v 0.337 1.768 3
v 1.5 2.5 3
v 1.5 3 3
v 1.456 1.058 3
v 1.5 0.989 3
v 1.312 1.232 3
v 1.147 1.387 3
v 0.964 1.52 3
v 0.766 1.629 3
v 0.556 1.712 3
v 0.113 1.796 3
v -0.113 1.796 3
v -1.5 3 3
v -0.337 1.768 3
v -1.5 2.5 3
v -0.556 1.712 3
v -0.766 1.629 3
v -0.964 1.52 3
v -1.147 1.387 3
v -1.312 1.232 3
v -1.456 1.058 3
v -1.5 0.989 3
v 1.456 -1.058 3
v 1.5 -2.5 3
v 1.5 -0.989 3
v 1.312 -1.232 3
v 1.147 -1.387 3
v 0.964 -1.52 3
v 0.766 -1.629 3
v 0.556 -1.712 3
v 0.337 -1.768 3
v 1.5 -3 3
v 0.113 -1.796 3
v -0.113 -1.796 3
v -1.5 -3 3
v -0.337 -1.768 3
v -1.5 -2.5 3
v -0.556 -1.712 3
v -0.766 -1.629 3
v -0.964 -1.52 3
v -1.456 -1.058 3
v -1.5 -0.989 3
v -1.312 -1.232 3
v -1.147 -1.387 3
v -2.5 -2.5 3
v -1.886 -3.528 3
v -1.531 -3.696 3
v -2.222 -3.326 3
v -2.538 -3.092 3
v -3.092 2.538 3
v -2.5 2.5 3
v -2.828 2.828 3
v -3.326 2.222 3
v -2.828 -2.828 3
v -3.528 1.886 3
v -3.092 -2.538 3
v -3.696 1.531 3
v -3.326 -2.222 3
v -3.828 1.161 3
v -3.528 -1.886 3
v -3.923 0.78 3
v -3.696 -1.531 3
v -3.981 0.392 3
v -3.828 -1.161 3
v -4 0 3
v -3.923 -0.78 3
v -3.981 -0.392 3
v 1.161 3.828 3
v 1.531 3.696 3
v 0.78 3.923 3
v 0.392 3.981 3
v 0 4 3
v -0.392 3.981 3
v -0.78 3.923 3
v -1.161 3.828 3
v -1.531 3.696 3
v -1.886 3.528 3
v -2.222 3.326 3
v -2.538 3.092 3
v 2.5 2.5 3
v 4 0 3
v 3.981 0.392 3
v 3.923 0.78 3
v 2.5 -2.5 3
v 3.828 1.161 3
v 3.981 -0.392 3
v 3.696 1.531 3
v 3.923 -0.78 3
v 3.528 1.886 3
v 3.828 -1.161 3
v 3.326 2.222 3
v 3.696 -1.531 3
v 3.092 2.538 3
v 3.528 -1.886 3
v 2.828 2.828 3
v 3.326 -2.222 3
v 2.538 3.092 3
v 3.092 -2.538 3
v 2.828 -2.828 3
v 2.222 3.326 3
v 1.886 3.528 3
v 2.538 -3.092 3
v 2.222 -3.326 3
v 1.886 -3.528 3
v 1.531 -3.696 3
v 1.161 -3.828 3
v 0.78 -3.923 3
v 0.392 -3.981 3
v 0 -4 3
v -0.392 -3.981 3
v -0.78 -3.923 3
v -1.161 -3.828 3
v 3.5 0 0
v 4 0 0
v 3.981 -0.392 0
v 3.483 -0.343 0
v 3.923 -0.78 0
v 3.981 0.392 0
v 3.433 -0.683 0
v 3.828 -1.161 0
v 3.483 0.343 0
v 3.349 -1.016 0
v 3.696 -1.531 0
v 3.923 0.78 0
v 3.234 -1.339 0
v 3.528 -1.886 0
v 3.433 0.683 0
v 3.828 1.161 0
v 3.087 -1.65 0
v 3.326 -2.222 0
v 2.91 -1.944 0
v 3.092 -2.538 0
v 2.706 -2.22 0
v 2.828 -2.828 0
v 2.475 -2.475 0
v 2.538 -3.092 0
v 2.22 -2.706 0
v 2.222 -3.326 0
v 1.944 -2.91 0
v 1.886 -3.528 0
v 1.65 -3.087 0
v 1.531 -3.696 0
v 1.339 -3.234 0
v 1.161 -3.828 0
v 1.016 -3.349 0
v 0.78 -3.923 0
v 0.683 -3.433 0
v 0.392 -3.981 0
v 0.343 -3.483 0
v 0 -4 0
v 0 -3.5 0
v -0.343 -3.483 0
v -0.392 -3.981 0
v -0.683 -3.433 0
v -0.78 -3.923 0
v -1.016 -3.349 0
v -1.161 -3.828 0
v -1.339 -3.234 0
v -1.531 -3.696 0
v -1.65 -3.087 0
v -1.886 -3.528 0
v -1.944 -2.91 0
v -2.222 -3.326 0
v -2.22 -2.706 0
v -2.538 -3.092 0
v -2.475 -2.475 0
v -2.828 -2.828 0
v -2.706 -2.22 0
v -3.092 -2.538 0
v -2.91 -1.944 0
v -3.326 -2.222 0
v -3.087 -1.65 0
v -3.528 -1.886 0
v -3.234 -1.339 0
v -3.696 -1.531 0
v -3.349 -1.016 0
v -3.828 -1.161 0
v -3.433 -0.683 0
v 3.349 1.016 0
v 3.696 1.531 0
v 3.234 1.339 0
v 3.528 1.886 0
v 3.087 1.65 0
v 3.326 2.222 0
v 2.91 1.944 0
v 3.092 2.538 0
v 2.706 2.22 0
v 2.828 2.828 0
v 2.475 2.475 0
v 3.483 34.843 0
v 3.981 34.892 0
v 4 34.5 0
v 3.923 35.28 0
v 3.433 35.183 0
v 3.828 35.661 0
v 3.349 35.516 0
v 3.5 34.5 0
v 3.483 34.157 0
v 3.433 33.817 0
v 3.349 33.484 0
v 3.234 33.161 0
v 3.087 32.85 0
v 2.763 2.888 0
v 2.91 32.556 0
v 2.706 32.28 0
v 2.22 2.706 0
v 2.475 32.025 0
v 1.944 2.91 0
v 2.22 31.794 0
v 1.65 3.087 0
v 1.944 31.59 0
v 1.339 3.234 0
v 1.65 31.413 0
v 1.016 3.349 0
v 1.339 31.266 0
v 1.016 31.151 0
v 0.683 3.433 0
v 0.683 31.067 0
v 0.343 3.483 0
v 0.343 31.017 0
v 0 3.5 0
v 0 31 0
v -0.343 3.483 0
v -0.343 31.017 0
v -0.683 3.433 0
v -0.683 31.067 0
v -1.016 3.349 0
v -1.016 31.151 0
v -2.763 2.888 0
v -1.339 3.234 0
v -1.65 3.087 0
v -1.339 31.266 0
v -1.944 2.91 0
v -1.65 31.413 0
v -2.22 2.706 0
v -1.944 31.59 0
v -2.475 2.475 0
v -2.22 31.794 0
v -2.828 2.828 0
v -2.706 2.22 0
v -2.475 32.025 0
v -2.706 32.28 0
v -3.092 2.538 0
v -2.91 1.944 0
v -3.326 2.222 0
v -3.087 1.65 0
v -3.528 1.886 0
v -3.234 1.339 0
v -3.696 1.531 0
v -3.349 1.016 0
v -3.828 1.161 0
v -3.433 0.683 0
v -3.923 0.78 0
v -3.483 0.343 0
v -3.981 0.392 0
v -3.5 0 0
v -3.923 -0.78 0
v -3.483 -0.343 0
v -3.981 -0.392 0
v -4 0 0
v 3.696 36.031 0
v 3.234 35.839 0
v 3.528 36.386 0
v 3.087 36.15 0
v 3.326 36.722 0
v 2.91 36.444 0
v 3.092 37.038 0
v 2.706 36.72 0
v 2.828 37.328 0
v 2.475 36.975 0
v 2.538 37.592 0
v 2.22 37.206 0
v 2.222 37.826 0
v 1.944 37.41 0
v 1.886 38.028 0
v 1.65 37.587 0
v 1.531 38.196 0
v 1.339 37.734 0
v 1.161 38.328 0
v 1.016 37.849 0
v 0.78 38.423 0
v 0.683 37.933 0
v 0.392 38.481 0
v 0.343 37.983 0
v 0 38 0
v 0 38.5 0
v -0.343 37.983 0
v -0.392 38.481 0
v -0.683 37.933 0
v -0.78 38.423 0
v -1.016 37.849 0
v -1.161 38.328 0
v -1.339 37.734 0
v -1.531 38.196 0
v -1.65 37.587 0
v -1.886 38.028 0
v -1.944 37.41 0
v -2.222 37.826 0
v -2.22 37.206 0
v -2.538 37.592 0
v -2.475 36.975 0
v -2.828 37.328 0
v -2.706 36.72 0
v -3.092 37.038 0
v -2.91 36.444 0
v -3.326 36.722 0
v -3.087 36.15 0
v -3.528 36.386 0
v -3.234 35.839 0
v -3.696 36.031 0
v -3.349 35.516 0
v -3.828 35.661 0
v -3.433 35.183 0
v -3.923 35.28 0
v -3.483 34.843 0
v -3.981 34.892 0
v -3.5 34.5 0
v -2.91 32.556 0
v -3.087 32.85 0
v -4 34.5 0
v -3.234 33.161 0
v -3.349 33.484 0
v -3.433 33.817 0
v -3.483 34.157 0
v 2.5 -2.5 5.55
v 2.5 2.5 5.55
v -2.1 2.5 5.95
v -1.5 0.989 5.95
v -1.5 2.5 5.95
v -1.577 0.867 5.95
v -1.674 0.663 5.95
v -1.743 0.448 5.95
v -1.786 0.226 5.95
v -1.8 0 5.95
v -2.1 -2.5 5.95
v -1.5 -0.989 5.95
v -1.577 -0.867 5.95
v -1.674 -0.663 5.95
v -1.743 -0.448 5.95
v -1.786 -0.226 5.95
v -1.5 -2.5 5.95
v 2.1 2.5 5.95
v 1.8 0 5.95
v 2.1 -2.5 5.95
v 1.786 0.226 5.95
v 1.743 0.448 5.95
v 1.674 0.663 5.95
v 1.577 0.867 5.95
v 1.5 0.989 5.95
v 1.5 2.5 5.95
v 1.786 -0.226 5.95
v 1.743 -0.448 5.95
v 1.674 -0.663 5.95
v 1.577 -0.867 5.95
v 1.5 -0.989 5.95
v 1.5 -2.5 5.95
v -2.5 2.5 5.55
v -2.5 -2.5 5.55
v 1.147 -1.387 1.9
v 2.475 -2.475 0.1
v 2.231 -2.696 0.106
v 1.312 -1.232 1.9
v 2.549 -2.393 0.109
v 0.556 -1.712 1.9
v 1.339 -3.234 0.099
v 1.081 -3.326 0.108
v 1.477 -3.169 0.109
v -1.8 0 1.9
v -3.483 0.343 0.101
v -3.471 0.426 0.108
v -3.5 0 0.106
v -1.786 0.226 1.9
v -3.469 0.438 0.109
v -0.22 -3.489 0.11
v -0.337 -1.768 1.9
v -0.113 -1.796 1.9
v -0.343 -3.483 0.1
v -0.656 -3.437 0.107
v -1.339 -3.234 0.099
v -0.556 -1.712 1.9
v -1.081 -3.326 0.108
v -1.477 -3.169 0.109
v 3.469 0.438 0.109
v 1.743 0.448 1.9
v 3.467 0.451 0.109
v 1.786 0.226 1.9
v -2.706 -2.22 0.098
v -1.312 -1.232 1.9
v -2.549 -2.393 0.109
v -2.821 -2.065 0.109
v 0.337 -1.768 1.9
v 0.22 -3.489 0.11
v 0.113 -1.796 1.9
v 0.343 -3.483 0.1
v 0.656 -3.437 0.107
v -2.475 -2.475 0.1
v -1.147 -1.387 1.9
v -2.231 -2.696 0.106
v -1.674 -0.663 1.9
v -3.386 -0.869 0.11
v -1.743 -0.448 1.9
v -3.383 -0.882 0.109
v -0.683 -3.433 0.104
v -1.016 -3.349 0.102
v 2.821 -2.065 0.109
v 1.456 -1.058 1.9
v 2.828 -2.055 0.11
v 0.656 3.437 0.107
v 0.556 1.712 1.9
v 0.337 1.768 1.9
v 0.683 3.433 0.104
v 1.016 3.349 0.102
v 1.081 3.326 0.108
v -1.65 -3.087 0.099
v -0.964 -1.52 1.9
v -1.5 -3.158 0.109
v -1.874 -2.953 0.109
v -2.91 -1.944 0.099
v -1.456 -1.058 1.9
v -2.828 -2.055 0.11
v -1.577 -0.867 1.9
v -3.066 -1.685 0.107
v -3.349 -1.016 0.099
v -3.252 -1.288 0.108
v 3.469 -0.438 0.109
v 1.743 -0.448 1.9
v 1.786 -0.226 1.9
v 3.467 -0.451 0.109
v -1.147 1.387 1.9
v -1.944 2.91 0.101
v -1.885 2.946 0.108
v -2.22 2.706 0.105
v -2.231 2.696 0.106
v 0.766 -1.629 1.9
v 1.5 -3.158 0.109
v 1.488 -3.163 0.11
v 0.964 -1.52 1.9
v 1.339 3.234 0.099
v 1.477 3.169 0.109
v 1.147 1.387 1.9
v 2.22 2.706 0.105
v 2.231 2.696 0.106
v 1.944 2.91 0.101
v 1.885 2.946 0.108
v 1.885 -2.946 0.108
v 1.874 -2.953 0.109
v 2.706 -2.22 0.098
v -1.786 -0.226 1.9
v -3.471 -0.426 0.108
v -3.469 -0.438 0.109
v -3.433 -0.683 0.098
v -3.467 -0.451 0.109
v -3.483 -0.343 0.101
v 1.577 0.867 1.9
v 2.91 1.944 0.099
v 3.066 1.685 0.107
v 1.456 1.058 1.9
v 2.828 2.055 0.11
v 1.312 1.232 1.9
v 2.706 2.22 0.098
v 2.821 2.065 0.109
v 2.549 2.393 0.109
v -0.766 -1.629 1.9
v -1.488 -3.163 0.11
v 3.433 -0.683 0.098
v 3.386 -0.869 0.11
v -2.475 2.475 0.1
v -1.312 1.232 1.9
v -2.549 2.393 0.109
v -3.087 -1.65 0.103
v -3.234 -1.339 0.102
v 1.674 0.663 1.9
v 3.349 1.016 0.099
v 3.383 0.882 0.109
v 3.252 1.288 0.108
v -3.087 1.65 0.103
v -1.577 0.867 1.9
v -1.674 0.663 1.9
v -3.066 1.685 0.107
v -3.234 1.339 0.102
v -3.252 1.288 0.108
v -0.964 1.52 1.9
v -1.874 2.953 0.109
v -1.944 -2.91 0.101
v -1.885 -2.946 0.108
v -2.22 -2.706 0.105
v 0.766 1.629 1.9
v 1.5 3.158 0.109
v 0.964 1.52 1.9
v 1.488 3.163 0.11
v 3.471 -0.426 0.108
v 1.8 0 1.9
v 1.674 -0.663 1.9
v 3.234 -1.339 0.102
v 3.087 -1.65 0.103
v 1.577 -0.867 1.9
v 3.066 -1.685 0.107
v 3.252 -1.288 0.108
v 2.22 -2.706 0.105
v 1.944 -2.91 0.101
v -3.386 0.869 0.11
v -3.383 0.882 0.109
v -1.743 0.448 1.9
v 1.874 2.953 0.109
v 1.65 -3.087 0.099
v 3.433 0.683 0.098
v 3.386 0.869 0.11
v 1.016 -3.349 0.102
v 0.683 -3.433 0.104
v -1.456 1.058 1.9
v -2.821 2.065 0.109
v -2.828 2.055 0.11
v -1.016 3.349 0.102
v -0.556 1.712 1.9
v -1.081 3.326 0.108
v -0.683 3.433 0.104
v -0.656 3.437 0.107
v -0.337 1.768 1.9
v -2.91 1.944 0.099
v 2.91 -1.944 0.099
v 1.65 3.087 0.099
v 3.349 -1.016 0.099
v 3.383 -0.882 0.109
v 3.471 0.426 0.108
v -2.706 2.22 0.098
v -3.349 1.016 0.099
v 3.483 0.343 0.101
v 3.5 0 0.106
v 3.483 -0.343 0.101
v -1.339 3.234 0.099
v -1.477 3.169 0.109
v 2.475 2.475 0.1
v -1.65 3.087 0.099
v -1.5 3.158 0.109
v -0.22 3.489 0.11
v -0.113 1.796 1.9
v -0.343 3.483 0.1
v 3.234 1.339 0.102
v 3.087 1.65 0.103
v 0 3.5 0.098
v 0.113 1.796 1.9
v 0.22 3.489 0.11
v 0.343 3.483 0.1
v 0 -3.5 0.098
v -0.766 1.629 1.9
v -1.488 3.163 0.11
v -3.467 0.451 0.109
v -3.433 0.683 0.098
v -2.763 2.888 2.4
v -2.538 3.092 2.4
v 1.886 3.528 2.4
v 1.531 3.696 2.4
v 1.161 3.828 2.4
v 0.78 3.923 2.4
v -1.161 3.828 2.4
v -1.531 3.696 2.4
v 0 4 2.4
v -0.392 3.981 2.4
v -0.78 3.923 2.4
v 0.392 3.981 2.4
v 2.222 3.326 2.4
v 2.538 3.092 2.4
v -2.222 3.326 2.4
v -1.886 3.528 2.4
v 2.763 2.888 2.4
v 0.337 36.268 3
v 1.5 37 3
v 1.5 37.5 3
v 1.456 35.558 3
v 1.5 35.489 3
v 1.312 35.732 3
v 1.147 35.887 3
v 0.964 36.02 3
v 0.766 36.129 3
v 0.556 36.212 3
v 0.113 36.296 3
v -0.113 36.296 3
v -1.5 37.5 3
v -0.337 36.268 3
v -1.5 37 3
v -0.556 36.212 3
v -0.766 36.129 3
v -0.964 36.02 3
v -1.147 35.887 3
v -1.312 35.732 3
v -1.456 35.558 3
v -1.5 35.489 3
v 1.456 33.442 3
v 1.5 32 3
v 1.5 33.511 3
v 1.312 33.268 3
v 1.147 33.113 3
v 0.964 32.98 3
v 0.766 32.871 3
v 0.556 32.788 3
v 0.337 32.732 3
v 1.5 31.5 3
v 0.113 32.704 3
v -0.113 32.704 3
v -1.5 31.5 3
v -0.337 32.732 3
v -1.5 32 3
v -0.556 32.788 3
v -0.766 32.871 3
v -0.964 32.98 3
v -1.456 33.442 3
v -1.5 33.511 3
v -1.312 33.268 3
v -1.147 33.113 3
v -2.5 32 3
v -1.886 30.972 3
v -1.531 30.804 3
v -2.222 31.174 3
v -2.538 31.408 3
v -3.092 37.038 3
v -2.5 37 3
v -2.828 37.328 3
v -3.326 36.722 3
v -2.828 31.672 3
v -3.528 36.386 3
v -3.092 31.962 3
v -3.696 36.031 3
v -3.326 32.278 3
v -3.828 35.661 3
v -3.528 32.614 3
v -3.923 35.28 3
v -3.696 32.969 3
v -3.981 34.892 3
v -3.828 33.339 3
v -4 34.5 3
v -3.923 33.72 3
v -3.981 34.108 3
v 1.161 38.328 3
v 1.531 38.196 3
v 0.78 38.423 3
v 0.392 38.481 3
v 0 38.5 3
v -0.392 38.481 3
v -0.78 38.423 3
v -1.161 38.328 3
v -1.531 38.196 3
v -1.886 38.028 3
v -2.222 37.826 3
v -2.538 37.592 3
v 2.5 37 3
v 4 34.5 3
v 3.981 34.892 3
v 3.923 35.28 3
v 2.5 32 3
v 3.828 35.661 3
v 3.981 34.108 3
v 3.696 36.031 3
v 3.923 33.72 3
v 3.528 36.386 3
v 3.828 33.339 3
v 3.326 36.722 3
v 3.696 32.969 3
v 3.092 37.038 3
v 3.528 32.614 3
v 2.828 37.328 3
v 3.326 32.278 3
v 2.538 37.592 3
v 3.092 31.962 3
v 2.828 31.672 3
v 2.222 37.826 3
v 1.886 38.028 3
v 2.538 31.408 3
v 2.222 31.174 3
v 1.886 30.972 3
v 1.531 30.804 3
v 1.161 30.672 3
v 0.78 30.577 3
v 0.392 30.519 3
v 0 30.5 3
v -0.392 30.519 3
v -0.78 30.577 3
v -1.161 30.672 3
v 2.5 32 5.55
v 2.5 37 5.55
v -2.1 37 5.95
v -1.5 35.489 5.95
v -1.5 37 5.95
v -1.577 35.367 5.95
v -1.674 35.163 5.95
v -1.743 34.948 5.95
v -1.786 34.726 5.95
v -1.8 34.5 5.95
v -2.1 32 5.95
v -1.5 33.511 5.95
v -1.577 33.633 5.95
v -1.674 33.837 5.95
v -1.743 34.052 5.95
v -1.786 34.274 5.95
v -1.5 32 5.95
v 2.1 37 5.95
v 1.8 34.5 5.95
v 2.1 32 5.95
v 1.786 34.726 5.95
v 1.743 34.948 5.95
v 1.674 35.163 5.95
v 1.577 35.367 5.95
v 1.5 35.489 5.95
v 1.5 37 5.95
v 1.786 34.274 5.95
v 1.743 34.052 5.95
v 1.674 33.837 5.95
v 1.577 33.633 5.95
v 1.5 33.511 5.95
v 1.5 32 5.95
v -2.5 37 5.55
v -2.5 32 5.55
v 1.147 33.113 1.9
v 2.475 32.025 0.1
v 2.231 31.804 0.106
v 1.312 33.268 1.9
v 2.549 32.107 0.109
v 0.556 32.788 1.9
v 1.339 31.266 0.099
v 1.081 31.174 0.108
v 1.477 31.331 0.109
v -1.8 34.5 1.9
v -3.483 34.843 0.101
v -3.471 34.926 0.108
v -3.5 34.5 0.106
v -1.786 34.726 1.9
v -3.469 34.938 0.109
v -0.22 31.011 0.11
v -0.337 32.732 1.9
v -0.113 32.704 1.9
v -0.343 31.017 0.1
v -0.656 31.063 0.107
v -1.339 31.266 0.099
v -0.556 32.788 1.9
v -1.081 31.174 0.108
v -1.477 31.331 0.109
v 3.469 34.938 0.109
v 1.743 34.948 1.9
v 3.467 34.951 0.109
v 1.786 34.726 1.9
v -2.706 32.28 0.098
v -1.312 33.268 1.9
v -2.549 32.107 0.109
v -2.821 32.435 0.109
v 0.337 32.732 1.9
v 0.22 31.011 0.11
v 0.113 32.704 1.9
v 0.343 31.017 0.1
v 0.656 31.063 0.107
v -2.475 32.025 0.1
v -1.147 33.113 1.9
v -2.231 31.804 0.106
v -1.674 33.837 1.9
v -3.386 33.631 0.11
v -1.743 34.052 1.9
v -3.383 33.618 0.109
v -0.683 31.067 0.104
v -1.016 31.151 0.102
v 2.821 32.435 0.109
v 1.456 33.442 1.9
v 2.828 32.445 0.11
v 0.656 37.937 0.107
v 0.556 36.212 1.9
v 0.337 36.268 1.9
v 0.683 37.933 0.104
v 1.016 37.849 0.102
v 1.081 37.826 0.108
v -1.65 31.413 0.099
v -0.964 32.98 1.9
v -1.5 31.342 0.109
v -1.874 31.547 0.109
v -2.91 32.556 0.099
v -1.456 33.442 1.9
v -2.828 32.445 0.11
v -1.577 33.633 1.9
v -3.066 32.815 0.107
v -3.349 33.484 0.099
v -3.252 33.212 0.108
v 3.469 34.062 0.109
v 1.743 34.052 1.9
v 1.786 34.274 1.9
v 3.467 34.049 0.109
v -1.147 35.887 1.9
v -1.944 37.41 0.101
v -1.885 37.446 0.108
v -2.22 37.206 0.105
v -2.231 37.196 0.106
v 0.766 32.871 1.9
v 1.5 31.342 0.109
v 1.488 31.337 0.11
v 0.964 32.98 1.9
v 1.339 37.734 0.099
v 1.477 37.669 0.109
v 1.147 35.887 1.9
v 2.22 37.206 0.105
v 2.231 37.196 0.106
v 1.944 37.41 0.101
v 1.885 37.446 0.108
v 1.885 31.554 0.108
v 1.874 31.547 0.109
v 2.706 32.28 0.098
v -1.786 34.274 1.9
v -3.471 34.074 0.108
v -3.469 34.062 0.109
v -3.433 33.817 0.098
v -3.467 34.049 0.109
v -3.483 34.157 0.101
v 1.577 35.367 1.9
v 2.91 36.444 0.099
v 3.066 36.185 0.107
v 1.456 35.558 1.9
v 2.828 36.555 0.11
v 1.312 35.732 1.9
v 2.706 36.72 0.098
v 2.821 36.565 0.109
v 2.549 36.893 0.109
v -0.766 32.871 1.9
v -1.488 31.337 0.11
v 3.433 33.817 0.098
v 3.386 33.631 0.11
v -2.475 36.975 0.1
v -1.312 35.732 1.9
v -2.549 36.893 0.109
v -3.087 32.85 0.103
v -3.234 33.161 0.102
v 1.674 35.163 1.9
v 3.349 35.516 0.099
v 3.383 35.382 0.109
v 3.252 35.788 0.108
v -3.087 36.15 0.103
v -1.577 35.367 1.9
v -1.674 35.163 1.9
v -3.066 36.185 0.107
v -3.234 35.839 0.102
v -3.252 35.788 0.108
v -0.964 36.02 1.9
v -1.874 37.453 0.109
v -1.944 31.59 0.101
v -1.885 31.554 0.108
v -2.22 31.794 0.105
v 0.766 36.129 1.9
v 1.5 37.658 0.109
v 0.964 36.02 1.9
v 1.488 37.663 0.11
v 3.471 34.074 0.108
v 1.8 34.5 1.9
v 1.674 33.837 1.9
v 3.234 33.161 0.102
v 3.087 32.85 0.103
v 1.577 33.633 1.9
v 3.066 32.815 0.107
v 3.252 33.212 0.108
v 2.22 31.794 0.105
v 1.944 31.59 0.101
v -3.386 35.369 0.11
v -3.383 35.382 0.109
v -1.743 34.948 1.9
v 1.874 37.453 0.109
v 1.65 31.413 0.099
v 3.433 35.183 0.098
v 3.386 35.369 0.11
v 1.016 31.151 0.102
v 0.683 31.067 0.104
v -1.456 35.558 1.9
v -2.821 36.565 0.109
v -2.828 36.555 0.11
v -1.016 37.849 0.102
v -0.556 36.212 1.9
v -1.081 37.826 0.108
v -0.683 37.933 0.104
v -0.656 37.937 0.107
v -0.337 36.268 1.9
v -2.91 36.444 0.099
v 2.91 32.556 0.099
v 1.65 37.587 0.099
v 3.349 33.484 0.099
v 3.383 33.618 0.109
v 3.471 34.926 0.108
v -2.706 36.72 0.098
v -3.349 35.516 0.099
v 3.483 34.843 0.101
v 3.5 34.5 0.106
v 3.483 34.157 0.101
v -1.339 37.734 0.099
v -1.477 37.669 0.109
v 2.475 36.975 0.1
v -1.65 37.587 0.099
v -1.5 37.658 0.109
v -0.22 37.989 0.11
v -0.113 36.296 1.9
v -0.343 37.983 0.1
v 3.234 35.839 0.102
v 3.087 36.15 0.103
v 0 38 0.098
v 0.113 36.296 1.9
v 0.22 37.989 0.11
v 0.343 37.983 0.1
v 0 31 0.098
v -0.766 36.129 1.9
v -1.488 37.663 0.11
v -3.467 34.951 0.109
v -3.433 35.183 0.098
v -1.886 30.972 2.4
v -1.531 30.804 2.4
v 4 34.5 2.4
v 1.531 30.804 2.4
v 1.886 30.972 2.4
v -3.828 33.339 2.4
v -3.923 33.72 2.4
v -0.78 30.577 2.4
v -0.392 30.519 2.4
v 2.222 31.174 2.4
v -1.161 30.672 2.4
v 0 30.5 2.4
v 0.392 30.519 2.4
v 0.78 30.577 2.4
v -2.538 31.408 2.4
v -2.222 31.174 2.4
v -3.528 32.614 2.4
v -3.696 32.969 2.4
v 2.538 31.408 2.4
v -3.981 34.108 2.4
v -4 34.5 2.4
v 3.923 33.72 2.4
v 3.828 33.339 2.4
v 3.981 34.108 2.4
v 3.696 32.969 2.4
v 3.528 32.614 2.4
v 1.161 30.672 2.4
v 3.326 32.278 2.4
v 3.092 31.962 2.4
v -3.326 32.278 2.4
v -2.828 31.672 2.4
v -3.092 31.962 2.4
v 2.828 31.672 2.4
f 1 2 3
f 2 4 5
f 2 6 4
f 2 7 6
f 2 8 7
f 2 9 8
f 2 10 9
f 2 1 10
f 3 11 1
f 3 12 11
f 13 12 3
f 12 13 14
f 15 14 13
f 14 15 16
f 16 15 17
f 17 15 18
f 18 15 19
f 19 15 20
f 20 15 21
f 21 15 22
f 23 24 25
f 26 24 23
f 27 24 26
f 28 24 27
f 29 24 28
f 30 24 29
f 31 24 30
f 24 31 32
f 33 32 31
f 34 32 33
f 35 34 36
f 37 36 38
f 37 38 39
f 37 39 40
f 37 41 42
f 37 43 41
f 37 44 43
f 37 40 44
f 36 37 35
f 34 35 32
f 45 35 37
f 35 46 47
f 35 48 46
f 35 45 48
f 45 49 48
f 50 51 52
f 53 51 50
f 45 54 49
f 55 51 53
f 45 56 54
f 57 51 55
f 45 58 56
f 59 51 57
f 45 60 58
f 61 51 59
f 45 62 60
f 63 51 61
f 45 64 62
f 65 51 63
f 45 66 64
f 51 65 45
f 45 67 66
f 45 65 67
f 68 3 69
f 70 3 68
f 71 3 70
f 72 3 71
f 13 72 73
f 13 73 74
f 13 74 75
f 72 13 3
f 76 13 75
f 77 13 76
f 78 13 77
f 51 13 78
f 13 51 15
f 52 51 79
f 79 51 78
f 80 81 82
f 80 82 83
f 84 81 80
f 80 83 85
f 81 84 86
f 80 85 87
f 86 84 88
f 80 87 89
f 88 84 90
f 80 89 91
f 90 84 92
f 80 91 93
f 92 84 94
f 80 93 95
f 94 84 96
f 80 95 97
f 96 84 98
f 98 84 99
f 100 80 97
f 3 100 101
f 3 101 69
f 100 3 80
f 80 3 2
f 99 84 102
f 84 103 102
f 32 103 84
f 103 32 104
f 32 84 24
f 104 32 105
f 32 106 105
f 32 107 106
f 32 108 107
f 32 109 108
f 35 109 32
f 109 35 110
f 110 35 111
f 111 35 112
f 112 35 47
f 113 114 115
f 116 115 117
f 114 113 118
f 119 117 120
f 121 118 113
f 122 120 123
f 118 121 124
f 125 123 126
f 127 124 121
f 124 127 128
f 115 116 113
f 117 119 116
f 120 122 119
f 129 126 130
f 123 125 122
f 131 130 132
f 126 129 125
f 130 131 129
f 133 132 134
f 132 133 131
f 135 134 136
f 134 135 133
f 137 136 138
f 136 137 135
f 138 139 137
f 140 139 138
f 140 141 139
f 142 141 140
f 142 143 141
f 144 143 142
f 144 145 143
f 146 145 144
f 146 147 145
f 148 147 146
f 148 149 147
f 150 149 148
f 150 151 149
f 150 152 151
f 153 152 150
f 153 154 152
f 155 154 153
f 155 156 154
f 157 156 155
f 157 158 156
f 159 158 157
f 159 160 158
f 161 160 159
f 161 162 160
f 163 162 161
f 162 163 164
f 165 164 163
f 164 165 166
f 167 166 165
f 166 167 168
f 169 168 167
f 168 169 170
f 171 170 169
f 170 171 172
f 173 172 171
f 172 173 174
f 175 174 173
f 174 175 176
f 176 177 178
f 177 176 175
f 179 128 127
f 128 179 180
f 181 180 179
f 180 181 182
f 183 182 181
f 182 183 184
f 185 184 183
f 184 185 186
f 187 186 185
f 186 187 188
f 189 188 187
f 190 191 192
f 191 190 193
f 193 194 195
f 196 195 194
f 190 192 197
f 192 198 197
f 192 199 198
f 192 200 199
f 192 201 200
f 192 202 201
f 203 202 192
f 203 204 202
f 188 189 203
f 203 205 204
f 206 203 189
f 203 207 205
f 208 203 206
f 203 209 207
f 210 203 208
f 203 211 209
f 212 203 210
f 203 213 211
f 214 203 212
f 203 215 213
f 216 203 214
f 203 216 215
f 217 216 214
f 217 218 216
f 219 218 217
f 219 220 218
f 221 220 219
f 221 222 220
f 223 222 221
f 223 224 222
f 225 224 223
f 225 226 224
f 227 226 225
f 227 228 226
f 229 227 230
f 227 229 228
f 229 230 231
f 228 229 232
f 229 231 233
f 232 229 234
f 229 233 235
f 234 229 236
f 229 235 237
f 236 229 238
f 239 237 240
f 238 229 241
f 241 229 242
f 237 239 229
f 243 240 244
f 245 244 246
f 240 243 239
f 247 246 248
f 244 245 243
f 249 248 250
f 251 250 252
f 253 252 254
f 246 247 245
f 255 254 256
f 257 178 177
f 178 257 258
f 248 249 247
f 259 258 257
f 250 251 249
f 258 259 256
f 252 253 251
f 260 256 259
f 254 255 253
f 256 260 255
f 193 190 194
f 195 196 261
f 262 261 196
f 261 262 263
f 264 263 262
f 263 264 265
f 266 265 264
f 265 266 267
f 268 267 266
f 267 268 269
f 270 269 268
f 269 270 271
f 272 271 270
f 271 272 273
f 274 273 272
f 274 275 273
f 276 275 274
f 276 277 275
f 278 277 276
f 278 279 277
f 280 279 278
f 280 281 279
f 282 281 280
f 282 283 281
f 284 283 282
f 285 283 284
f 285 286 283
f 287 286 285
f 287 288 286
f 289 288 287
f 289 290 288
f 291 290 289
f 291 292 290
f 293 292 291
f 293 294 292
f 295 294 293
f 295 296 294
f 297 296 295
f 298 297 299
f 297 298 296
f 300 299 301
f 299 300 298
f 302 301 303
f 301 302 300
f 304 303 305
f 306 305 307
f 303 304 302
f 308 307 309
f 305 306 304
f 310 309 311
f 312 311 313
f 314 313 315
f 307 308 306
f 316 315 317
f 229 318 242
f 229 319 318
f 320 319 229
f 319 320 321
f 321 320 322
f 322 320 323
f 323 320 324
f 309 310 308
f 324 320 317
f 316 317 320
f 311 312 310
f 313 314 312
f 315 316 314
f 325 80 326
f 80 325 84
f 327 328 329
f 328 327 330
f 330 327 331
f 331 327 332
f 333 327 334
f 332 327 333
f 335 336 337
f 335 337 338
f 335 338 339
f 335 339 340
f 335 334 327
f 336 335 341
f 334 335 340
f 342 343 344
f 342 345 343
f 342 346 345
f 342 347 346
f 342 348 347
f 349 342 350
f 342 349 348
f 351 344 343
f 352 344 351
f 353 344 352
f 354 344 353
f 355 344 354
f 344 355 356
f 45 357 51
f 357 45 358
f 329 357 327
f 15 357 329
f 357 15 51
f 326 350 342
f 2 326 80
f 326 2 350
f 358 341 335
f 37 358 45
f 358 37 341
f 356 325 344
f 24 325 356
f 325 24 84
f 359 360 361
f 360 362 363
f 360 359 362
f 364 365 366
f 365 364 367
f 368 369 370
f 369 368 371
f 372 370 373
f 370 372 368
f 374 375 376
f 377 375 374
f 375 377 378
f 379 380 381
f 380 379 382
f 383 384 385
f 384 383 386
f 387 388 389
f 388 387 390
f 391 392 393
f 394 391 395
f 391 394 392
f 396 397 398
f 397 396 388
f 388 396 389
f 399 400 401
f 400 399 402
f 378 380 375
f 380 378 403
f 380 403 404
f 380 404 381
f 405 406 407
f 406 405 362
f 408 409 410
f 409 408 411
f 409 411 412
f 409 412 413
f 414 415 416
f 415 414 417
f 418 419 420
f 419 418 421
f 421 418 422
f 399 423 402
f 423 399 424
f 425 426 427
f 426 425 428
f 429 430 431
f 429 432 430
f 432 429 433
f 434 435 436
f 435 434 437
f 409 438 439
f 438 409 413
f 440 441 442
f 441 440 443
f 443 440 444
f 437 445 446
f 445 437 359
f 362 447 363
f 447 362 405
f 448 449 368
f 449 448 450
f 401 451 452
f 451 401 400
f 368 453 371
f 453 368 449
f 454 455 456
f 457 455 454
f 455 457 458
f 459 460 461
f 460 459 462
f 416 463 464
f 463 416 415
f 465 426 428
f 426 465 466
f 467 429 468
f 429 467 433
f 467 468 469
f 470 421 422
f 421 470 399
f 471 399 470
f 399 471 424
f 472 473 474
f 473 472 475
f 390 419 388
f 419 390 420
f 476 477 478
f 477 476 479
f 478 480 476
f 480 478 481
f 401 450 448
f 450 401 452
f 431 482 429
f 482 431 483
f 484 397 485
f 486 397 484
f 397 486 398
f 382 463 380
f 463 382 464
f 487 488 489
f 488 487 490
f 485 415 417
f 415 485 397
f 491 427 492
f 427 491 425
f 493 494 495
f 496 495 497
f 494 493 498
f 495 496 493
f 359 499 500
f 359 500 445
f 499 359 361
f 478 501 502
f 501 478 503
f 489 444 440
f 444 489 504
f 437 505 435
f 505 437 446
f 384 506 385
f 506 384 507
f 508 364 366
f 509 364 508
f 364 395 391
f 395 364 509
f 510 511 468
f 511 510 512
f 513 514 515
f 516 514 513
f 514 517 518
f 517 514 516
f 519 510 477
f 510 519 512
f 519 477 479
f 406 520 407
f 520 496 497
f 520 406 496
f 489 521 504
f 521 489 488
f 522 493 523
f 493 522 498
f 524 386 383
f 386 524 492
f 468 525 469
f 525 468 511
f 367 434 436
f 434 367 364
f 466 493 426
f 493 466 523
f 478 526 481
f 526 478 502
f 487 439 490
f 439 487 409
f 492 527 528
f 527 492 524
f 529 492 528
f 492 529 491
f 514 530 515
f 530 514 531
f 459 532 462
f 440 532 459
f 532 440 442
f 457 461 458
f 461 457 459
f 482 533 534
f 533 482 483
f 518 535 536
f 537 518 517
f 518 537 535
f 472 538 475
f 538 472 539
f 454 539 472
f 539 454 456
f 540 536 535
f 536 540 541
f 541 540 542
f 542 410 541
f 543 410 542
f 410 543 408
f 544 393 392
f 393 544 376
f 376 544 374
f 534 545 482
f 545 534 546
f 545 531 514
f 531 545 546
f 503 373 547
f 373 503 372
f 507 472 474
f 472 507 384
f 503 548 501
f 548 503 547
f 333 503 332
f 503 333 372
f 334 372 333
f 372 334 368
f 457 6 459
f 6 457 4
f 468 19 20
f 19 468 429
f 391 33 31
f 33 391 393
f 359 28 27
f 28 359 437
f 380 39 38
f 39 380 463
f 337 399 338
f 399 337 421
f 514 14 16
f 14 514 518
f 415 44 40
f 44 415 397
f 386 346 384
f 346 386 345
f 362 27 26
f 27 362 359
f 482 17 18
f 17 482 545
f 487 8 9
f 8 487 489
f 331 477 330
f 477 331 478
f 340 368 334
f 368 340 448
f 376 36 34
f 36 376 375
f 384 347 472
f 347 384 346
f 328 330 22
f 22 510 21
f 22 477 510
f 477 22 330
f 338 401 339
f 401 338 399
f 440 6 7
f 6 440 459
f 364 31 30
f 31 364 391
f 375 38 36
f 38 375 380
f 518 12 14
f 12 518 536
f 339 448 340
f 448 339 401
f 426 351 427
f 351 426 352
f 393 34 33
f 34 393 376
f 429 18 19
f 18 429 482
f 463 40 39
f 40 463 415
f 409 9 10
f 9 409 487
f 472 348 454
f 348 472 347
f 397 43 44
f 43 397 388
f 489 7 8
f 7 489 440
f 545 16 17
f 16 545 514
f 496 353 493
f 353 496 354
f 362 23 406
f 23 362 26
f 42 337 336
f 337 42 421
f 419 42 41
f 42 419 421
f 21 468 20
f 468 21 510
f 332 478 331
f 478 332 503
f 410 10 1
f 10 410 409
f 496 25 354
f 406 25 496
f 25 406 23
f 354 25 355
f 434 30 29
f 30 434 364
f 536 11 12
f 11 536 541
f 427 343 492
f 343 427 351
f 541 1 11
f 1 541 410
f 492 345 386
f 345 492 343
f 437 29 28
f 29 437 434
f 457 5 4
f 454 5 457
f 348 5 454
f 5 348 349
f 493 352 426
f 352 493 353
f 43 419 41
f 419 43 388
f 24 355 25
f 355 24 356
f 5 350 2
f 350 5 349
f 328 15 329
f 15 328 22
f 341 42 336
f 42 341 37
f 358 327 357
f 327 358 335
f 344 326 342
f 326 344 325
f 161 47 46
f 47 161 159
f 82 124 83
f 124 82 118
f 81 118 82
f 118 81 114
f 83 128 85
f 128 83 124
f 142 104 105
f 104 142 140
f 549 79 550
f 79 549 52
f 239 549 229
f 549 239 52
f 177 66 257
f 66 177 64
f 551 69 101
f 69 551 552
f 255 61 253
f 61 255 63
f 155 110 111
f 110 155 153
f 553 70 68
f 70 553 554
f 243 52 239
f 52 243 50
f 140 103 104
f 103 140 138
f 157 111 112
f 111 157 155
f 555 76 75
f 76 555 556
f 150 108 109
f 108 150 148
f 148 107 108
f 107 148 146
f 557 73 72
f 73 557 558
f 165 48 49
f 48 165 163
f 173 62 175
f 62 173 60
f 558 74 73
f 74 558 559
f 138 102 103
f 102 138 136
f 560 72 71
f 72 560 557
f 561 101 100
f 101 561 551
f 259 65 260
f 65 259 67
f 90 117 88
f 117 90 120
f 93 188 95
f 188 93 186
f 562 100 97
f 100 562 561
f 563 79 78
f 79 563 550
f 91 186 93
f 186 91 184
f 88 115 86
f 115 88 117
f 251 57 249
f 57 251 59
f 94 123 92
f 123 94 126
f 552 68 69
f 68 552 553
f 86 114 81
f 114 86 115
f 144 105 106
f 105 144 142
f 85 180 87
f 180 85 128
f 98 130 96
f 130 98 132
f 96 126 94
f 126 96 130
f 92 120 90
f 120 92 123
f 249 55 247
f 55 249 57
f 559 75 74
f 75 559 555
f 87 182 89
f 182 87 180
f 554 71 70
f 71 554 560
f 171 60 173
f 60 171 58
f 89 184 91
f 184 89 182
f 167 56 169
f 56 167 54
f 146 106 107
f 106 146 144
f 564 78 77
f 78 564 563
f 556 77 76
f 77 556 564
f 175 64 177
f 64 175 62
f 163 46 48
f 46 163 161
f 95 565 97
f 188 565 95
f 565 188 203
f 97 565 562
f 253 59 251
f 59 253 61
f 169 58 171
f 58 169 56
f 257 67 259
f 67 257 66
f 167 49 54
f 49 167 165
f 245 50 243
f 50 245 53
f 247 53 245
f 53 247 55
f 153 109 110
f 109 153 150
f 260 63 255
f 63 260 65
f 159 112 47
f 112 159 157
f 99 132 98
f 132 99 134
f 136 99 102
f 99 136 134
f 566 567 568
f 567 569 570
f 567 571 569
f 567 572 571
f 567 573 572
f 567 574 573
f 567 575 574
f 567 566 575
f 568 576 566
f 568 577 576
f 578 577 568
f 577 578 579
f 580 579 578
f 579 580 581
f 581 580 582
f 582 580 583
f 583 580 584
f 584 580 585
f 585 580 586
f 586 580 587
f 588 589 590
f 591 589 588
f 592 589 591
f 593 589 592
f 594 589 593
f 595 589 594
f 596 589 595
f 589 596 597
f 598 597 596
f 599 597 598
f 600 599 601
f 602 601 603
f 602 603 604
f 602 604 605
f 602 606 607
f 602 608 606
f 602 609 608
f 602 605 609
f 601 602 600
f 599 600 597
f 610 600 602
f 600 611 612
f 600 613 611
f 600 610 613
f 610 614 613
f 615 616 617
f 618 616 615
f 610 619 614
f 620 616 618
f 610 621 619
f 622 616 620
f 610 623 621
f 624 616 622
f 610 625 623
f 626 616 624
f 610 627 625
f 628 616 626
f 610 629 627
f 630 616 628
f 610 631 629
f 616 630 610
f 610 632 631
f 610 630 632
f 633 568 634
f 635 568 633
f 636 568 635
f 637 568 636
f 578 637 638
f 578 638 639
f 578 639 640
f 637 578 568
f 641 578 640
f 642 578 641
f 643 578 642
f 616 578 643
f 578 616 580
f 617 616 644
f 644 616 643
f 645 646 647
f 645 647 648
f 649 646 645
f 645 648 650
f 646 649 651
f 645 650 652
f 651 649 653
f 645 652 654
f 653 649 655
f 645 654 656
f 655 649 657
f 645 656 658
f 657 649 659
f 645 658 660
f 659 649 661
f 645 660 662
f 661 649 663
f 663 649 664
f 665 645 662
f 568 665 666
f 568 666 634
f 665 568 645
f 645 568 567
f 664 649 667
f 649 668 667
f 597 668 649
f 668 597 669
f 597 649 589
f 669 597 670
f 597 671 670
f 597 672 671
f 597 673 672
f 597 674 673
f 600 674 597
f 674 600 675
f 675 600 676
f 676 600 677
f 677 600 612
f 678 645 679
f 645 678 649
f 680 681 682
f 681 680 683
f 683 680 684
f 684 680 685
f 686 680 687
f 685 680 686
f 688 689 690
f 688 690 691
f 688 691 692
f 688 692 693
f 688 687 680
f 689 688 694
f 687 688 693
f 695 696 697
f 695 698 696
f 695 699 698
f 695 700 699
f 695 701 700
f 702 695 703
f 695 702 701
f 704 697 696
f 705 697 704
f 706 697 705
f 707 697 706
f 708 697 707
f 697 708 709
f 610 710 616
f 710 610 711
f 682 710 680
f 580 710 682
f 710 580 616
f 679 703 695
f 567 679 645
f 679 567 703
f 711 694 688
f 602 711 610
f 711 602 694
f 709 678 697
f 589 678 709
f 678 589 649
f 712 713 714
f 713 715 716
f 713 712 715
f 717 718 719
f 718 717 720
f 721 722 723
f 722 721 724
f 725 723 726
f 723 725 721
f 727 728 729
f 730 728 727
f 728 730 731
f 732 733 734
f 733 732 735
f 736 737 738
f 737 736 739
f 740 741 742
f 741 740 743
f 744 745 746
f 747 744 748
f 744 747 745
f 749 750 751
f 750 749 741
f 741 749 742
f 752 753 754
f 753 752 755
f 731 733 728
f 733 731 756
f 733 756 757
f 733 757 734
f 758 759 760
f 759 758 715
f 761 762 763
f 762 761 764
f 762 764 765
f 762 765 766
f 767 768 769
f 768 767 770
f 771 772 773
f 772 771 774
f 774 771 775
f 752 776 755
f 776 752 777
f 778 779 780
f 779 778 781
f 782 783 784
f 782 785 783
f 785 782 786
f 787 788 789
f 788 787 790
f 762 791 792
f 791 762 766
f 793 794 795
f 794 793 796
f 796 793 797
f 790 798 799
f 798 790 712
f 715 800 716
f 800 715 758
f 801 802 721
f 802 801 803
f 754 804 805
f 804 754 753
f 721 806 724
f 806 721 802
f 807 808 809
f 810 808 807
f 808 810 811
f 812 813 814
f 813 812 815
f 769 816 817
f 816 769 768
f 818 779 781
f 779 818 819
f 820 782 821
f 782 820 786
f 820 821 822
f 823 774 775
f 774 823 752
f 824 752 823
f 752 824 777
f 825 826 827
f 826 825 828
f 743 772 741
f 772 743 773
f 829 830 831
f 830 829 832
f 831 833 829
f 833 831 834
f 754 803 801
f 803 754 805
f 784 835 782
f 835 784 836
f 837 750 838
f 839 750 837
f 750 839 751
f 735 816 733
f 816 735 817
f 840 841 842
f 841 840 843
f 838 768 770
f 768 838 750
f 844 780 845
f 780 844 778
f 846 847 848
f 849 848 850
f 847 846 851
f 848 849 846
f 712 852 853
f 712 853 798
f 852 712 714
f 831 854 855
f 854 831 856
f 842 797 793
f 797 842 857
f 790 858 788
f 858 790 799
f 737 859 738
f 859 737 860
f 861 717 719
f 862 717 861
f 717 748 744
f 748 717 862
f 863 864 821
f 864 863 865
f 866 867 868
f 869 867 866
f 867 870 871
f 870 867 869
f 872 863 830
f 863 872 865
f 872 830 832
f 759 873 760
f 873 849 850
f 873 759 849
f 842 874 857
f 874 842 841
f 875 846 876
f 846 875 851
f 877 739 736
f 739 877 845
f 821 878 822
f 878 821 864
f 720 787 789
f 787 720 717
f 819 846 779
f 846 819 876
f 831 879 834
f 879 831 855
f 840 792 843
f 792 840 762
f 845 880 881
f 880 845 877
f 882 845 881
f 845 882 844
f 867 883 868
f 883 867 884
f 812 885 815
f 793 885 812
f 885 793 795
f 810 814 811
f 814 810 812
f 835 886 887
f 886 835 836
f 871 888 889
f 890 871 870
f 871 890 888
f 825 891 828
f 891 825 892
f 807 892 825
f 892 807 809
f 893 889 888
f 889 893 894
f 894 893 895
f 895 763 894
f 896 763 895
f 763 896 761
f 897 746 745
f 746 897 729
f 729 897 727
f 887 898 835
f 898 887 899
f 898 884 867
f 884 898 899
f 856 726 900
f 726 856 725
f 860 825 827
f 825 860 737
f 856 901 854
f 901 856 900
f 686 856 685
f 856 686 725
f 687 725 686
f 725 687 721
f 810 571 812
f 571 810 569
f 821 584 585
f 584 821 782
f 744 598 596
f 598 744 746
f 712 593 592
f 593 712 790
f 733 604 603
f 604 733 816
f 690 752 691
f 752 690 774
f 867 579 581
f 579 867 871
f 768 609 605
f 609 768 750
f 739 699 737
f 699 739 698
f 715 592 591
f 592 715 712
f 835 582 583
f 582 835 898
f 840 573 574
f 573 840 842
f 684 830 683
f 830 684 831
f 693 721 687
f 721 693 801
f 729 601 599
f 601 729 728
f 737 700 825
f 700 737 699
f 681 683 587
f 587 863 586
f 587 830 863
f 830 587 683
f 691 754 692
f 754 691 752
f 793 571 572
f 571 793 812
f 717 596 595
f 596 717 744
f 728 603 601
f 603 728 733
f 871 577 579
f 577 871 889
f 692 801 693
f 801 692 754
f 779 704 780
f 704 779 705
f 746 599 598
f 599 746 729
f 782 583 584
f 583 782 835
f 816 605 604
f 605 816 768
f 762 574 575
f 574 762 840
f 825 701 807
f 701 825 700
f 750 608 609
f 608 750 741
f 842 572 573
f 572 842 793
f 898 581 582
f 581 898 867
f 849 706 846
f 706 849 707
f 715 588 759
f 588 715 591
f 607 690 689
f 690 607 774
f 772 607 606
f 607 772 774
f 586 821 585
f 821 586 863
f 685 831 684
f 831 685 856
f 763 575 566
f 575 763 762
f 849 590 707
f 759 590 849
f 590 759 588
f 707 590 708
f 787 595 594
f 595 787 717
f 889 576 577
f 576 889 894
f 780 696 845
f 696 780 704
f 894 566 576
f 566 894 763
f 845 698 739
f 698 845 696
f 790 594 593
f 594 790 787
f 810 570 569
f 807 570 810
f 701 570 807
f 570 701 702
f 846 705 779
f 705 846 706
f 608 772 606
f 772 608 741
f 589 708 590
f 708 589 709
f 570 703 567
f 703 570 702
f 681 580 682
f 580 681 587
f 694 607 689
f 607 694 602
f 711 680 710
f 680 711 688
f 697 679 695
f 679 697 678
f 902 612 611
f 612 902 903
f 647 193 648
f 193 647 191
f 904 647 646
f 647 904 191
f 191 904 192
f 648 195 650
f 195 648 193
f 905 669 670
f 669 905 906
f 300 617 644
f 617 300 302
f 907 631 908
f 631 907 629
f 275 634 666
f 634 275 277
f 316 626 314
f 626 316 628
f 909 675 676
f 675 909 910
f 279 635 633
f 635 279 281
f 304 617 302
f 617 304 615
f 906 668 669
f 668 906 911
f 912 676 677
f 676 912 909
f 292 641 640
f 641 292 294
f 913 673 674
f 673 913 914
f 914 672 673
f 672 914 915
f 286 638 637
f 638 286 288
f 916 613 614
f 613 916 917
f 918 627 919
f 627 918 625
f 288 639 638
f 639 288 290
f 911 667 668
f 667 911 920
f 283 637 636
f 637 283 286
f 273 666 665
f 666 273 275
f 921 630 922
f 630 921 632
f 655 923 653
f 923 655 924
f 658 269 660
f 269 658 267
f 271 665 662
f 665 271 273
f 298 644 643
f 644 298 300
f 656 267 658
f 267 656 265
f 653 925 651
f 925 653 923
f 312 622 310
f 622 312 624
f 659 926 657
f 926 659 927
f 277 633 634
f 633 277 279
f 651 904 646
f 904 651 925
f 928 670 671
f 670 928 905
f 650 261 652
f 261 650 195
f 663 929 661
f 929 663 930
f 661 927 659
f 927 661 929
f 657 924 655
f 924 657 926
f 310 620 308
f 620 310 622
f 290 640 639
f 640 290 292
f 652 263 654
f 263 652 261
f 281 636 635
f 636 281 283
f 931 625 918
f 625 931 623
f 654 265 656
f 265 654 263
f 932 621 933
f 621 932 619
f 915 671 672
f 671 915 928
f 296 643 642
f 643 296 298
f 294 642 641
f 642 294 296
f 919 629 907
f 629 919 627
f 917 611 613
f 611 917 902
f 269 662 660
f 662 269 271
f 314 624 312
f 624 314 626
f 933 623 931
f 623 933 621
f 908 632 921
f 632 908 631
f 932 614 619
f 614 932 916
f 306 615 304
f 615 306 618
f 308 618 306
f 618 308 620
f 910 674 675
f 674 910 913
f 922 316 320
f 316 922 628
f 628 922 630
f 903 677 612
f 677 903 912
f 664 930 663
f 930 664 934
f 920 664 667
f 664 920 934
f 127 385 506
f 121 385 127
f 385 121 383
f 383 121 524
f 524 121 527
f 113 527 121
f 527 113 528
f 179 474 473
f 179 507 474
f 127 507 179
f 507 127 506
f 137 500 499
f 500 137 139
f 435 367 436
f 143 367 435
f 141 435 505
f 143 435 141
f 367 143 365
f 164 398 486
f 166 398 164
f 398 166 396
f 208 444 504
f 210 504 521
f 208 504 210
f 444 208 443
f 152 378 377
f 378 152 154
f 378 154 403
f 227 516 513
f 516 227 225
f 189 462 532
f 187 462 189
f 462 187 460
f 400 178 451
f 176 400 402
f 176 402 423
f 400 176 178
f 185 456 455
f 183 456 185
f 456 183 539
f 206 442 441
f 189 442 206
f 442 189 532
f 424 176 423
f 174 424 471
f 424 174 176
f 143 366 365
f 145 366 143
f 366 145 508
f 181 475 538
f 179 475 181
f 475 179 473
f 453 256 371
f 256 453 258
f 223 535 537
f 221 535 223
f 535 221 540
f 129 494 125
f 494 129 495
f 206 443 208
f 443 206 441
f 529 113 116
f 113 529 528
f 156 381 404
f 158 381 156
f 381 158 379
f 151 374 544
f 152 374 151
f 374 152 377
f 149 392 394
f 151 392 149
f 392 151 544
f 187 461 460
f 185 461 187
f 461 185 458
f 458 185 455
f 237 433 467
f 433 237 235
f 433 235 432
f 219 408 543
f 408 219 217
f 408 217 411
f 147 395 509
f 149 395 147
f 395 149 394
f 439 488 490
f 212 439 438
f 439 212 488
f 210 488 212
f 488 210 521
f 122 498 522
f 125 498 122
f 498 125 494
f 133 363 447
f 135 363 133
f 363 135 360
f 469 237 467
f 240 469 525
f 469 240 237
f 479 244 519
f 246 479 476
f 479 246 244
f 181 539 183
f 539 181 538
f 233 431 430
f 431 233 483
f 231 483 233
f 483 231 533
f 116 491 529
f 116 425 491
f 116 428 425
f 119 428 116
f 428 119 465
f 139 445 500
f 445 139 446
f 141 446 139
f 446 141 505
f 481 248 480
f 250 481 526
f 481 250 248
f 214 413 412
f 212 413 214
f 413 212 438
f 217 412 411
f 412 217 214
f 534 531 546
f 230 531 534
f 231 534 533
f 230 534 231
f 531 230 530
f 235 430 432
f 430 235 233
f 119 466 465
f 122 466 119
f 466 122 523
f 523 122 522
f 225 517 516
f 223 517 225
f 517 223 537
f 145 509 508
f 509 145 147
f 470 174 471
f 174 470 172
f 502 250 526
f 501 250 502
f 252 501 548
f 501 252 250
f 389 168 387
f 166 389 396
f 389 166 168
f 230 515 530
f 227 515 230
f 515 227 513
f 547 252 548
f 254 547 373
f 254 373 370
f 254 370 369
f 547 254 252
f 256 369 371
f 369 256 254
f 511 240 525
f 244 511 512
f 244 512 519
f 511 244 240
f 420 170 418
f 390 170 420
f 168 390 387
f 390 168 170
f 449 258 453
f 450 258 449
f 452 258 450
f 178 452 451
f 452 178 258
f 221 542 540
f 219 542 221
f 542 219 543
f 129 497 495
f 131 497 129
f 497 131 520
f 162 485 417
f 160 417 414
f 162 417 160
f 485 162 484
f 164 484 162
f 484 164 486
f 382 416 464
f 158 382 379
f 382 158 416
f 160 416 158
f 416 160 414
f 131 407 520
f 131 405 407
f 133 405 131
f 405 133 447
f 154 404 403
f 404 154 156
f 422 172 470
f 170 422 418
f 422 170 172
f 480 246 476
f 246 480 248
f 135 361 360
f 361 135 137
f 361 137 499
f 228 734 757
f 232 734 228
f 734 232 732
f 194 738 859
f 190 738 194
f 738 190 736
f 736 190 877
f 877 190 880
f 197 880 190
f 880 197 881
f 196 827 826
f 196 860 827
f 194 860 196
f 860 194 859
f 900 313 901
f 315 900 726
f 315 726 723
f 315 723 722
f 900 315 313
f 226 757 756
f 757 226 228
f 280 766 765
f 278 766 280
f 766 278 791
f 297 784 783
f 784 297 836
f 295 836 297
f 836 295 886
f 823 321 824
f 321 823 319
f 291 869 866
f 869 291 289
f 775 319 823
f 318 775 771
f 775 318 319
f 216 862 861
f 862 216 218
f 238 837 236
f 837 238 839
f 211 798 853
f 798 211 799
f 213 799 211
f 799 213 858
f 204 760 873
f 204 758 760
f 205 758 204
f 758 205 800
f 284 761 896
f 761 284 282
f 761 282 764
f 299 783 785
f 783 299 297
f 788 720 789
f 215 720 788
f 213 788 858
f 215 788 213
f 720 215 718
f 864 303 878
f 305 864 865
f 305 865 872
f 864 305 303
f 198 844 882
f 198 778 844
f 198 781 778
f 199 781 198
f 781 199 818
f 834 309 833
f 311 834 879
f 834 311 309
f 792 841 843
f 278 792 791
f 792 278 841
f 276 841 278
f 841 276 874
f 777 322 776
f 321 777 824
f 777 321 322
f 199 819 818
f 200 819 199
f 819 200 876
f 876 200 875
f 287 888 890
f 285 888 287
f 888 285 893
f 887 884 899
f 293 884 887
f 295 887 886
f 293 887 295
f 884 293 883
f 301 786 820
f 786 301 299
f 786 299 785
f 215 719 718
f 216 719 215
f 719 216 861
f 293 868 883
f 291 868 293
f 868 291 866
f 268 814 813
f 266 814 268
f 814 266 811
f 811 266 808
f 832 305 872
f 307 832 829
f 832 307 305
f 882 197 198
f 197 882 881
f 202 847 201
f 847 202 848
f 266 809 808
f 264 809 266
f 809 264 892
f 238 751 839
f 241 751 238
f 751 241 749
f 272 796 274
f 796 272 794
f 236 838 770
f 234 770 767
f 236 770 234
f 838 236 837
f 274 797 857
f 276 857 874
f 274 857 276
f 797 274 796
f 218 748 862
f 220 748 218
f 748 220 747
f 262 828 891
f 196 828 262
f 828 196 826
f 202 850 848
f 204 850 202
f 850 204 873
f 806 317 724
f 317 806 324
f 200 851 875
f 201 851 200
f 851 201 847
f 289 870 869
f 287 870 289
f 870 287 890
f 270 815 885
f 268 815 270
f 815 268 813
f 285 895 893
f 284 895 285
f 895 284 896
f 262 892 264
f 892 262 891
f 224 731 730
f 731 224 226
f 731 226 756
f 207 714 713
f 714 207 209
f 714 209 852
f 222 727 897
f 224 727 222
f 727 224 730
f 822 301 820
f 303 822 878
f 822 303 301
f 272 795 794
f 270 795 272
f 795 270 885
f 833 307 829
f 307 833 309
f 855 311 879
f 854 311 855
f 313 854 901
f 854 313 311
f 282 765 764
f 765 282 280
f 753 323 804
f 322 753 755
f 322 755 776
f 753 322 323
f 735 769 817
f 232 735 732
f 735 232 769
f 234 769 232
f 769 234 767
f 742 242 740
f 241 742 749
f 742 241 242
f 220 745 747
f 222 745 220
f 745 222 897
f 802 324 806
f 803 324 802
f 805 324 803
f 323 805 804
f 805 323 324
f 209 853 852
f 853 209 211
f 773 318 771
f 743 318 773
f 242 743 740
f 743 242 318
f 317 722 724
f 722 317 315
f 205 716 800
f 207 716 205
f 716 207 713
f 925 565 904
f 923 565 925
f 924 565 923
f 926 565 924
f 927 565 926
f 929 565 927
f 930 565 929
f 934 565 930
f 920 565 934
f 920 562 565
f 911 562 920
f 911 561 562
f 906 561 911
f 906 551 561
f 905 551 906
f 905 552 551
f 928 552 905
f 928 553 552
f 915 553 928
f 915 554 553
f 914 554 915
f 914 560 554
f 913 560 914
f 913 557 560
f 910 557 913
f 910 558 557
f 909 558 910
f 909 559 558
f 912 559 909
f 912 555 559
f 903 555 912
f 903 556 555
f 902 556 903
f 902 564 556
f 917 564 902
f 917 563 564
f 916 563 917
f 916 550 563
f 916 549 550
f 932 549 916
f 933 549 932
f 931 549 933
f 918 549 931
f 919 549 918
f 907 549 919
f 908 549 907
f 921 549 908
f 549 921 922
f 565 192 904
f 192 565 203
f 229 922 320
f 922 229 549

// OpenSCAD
// file: native_adapter.scad
$fn = 50;

difference() {
	union() {
		translate(v = [0, 0, 0]) {
			rotate(a = [0, 0, 0]) {
				difference() {
					union() {
						translate(v = [-0.35, 0, 0]) {
							hull() {
								translate(v = [-4.4, 4.25, 0]) {
									cylinder(h = 3.0, r = 0.75);
								}
								translate(v = [4.4, 4.25, 0]) {
									cylinder(h = 3.0, r = 0.75);
								}
								translate(v = [-4.4, -4.25, 0]) {
									cylinder(h = 3.0, r = 0.75);
								}
								translate(v = [4.4, -4.25, 0]) {
									cylinder(h = 3.0, r = 0.75);
								}
							}
						}
						translate(v = [-2.5, -2.5, 2.95]) {
							cube(size = [5.0, 5.0, 3.0]);
						}
					}
					union() {
						translate(v = [0, 0, 0]) {
							rotate(a = [0, 180, 0]) {
								difference() {
									union() {
										translate(v = [0, 0, -20.0]) {
											cylinder(h = 20.0, r = 1.5);
										}
										translate(v = [0, 0, -1.9]) {
											cylinder(h = 1.9, r1 = 1.8, r2 = 3.6);
										}
										cylinder(h = 250, r = 3.6);
										translate(v = [0, 0, -20.0]) {
											cylinder(h = 20.0, r = 1.8);
										}
										translate(v = [0, 0, -20.0]) {
											cylinder(h = 20.0, r = 1.5);
										}
									}
									union();
								}
							}
						}
						translate(v = [-1.5, -3.0, 3.0]) {
							cube(size = [3.0, 6.0, 3.0500000000000003]);
						}
						translate(v = [0, 2.6, 0]) {
							rotate(a = [90, 0, 0]) {
								linear_extrude(height = 5.2) {
									polygon(points = [[-2.7, 5.3500000000000005], [-1.9, 6.15], [-2.7, 6.15]]);
								}
							}
						}
						translate(v = [0, 2.6, 0]) {
							rotate(a = [90, 0, 0]) {
								linear_extrude(height = 5.2) {
									polygon(points = [[2.7, 5.3500000000000005], [1.9, 6.15], [2.7, 6.15]]);
								}
							}
						}
						translate(v = [-4.6, -5.5, -0.1]) {
							cylinder(h = 3.2, r = 3.15);
						}
						translate(v = [-4.6, 5.5, -0.1]) {
							cylinder(h = 3.2, r = 3.15);
						}
						translate(v = [4.6, -5.5, -0.1]) {
							cylinder(h = 3.2, r = 3.15);
						}
						translate(v = [4.6, 5.5, -0.1]) {
							cylinder(h = 3.2, r = 3.15);
						}
					}
				}
			}
		}
	}
	union();
}
// file: beam_joint_geometry.scad
$fn=64;
tie_t=2.4;
module native_adapter(){
include <native_adapter.scad>
}

module joint_bores(holes,wood) {
  // Leave the OOBB countersink and pilot cheeks of each native adapter intact.
  for(p=holes) translate([p[0],p[1],-.05]) cylinder(d=7,h=tie_t+.1);
  if(len(wood)) translate(wood) {
    translate([0,0,-.05]) cylinder(d=4,h=tie_t+.1);
    translate([0,0,-.01]) cylinder(d1=7.02,d2=4,h=1.51);
  }
}

module foot(p,r) { translate(p) circle(r=r); }
module strap(a,b,ra,rb) { hull(){ foot(a,ra); foot(b,rb); } }
module beam_joint(holes,spine=[],wood=[]) {
  union(){
    for(p=holes) translate(p) intersection(){
      native_adapter();
      cylinder(r=4,h=12);
    }
    difference(){
      linear_extrude(tie_t) union(){
        if(len(wood)) strap(holes[0],wood,4,4.6);
        else if(len(spine)==0) strap(holes[0],holes[1],4,4);
        else {
          strap(spine[0],spine[1],2.65,2.65);
          for(p=holes) strap(p,[spine[0][0],p[1]],4,2.65);
        }
      }
      joint_bores(holes,wood);
    }
  }
}
// main file
include <beam_joint_geometry.scad>
beam_joint([[0, 0], [0, 34.5]],[-0.9, -3.9, 9.6, 38.4],[],[[4.6, 5.5, 5.5, 2.05], [4.6, 17.0, 17.5, 2.05], [4.6, 29.0, 29.0, 2.05]]);
